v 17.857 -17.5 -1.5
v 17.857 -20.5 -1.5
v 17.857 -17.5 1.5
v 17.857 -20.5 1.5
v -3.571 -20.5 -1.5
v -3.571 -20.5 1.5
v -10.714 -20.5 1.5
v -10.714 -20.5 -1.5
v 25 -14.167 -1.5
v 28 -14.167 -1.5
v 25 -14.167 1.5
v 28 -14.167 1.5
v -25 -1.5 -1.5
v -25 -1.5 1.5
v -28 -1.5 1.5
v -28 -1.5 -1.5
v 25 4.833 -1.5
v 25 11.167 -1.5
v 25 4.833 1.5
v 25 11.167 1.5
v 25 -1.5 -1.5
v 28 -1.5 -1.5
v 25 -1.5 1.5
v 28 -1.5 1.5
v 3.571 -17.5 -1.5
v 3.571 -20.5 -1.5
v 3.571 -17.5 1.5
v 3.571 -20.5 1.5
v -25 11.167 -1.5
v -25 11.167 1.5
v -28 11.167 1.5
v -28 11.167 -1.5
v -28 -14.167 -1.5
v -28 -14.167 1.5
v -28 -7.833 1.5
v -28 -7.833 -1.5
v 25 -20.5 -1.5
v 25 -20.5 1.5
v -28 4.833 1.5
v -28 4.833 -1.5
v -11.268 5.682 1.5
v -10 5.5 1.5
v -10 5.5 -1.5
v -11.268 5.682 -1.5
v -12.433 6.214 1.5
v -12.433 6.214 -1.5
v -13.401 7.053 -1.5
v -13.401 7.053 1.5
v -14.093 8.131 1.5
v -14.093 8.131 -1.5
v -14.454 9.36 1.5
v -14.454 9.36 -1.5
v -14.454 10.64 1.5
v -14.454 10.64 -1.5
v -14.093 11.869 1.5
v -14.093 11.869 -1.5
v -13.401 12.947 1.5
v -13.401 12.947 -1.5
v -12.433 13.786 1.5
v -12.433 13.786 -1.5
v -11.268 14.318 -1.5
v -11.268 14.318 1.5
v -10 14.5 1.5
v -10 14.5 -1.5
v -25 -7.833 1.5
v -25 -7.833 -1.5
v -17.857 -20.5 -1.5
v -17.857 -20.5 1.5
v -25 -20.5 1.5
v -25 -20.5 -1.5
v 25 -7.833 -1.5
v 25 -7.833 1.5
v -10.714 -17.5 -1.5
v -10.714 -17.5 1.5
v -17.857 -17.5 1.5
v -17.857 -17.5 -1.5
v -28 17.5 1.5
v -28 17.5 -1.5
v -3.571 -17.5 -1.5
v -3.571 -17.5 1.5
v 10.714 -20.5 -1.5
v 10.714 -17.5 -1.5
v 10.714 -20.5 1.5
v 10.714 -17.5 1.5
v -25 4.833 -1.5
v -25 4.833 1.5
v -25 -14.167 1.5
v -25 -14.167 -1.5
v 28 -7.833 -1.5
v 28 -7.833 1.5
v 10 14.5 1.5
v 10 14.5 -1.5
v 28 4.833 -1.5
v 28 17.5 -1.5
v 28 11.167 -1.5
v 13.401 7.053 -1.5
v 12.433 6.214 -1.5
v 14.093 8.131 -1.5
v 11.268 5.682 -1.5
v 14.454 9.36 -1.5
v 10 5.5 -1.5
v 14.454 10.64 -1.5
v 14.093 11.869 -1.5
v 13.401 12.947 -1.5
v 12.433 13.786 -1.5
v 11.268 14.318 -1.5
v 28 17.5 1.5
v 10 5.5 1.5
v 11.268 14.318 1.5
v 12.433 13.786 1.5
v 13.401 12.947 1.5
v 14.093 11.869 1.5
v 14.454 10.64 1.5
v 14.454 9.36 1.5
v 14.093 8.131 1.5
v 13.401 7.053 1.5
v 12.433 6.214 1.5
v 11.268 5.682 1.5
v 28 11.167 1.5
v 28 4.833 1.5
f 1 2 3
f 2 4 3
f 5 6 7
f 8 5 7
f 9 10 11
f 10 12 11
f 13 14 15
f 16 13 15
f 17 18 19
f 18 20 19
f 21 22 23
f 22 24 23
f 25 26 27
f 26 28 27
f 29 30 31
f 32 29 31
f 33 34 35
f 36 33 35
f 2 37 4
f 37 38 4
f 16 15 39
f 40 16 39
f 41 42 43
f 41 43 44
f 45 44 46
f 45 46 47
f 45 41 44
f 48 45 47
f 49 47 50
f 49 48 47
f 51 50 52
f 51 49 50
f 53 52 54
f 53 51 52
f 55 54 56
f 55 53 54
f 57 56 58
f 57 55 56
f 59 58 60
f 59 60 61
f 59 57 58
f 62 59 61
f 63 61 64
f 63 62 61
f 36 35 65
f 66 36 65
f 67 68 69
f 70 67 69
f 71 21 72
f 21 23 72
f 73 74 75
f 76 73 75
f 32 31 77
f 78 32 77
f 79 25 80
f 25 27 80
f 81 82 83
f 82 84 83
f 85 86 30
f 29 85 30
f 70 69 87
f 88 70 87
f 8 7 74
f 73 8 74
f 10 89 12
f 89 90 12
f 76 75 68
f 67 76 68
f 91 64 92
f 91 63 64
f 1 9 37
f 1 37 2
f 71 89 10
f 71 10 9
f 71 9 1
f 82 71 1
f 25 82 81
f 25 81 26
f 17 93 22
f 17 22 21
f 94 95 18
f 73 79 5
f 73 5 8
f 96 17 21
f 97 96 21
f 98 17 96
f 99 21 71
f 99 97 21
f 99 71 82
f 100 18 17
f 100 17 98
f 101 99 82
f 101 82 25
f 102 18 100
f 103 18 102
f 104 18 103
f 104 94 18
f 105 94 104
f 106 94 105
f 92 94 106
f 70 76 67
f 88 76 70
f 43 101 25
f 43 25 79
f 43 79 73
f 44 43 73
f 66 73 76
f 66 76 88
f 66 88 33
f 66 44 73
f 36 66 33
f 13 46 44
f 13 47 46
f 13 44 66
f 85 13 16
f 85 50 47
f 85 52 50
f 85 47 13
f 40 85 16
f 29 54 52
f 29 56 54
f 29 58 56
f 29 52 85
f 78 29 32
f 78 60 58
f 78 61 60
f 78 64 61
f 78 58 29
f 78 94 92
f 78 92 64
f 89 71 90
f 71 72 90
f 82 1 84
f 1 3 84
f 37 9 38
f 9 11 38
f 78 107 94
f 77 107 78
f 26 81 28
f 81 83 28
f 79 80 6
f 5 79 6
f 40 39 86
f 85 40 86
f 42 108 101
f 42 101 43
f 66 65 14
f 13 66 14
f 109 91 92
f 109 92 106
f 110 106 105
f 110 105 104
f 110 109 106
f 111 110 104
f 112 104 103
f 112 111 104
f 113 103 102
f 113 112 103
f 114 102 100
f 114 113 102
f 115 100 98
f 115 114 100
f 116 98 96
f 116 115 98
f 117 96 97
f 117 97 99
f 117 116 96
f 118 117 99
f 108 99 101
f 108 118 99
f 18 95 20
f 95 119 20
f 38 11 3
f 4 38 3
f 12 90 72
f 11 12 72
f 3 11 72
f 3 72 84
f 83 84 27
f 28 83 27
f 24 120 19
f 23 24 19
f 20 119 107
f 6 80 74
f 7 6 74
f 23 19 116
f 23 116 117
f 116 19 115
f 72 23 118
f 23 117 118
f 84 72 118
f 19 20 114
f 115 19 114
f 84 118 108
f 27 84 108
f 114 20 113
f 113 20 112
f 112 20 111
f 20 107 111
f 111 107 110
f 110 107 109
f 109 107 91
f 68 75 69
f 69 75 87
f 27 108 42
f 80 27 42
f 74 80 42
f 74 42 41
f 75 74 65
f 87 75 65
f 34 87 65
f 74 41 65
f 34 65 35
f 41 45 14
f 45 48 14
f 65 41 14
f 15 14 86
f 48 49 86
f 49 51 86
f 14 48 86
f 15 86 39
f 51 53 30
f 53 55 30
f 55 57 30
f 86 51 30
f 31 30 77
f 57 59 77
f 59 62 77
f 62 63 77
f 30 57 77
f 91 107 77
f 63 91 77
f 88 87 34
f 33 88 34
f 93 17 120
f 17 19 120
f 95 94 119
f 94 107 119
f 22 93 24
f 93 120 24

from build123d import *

# Parameters (mm, degrees)
ESTRUSIONE_ESTRUSIONE1_DEPTH = 1.5


with BuildPart() as part:
    # Schizzo1 → Estrusione-Estrusione1 (new body, symmetric)
    with BuildSketch(Plane.XY):
        Polygon((25, 17.5), (28, 17.5), (28, 11.166666667), (25, 11.166666667), (25, 4.833333333), (28, 4.833333333), (28, -1.5), (25, -1.5), (25, -7.833333333), (28, -7.833333333), (28, -14.166666667), (25, -14.166666667), (25, -20.5), (17.857142857, -20.5), (17.857142857, -17.5), (10.714285714, -17.5), (10.714285714, -20.5), (3.571428571, -20.5), (3.571428571, -17.5), (-3.571428571, -17.5), (-3.571428571, -20.5), (-10.714285714, -20.5), (-10.714285714, -17.5), (-17.857142857, -17.5), (-17.857142857, -20.5), (-25, -20.5), (-25, -14.166666667), (-28, -14.166666667), (-28, -7.833333333), (-25, -7.833333333), (-25, -1.5), (-28, -1.5), (-28, 4.833333333), (-25, 4.833333333), (-25, 11.166666667), (-28, 11.166666667), (-28, 17.5), (-25, 17.5), align=None)
        with BuildLine():
            Line((-10, 14.5), (10, 14.5))
            ThreePointArc((10, 14.5), (14.5, 10), (10, 5.5))
            Line((10, 5.5), (-10, 5.5))
            ThreePointArc((-10, 5.5), (-14.5, 10), (-10, 14.5))
        make_face(mode=Mode.SUBTRACT)
    extrude(amount=ESTRUSIONE_ESTRUSIONE1_DEPTH, both=True)


solid = part.part
